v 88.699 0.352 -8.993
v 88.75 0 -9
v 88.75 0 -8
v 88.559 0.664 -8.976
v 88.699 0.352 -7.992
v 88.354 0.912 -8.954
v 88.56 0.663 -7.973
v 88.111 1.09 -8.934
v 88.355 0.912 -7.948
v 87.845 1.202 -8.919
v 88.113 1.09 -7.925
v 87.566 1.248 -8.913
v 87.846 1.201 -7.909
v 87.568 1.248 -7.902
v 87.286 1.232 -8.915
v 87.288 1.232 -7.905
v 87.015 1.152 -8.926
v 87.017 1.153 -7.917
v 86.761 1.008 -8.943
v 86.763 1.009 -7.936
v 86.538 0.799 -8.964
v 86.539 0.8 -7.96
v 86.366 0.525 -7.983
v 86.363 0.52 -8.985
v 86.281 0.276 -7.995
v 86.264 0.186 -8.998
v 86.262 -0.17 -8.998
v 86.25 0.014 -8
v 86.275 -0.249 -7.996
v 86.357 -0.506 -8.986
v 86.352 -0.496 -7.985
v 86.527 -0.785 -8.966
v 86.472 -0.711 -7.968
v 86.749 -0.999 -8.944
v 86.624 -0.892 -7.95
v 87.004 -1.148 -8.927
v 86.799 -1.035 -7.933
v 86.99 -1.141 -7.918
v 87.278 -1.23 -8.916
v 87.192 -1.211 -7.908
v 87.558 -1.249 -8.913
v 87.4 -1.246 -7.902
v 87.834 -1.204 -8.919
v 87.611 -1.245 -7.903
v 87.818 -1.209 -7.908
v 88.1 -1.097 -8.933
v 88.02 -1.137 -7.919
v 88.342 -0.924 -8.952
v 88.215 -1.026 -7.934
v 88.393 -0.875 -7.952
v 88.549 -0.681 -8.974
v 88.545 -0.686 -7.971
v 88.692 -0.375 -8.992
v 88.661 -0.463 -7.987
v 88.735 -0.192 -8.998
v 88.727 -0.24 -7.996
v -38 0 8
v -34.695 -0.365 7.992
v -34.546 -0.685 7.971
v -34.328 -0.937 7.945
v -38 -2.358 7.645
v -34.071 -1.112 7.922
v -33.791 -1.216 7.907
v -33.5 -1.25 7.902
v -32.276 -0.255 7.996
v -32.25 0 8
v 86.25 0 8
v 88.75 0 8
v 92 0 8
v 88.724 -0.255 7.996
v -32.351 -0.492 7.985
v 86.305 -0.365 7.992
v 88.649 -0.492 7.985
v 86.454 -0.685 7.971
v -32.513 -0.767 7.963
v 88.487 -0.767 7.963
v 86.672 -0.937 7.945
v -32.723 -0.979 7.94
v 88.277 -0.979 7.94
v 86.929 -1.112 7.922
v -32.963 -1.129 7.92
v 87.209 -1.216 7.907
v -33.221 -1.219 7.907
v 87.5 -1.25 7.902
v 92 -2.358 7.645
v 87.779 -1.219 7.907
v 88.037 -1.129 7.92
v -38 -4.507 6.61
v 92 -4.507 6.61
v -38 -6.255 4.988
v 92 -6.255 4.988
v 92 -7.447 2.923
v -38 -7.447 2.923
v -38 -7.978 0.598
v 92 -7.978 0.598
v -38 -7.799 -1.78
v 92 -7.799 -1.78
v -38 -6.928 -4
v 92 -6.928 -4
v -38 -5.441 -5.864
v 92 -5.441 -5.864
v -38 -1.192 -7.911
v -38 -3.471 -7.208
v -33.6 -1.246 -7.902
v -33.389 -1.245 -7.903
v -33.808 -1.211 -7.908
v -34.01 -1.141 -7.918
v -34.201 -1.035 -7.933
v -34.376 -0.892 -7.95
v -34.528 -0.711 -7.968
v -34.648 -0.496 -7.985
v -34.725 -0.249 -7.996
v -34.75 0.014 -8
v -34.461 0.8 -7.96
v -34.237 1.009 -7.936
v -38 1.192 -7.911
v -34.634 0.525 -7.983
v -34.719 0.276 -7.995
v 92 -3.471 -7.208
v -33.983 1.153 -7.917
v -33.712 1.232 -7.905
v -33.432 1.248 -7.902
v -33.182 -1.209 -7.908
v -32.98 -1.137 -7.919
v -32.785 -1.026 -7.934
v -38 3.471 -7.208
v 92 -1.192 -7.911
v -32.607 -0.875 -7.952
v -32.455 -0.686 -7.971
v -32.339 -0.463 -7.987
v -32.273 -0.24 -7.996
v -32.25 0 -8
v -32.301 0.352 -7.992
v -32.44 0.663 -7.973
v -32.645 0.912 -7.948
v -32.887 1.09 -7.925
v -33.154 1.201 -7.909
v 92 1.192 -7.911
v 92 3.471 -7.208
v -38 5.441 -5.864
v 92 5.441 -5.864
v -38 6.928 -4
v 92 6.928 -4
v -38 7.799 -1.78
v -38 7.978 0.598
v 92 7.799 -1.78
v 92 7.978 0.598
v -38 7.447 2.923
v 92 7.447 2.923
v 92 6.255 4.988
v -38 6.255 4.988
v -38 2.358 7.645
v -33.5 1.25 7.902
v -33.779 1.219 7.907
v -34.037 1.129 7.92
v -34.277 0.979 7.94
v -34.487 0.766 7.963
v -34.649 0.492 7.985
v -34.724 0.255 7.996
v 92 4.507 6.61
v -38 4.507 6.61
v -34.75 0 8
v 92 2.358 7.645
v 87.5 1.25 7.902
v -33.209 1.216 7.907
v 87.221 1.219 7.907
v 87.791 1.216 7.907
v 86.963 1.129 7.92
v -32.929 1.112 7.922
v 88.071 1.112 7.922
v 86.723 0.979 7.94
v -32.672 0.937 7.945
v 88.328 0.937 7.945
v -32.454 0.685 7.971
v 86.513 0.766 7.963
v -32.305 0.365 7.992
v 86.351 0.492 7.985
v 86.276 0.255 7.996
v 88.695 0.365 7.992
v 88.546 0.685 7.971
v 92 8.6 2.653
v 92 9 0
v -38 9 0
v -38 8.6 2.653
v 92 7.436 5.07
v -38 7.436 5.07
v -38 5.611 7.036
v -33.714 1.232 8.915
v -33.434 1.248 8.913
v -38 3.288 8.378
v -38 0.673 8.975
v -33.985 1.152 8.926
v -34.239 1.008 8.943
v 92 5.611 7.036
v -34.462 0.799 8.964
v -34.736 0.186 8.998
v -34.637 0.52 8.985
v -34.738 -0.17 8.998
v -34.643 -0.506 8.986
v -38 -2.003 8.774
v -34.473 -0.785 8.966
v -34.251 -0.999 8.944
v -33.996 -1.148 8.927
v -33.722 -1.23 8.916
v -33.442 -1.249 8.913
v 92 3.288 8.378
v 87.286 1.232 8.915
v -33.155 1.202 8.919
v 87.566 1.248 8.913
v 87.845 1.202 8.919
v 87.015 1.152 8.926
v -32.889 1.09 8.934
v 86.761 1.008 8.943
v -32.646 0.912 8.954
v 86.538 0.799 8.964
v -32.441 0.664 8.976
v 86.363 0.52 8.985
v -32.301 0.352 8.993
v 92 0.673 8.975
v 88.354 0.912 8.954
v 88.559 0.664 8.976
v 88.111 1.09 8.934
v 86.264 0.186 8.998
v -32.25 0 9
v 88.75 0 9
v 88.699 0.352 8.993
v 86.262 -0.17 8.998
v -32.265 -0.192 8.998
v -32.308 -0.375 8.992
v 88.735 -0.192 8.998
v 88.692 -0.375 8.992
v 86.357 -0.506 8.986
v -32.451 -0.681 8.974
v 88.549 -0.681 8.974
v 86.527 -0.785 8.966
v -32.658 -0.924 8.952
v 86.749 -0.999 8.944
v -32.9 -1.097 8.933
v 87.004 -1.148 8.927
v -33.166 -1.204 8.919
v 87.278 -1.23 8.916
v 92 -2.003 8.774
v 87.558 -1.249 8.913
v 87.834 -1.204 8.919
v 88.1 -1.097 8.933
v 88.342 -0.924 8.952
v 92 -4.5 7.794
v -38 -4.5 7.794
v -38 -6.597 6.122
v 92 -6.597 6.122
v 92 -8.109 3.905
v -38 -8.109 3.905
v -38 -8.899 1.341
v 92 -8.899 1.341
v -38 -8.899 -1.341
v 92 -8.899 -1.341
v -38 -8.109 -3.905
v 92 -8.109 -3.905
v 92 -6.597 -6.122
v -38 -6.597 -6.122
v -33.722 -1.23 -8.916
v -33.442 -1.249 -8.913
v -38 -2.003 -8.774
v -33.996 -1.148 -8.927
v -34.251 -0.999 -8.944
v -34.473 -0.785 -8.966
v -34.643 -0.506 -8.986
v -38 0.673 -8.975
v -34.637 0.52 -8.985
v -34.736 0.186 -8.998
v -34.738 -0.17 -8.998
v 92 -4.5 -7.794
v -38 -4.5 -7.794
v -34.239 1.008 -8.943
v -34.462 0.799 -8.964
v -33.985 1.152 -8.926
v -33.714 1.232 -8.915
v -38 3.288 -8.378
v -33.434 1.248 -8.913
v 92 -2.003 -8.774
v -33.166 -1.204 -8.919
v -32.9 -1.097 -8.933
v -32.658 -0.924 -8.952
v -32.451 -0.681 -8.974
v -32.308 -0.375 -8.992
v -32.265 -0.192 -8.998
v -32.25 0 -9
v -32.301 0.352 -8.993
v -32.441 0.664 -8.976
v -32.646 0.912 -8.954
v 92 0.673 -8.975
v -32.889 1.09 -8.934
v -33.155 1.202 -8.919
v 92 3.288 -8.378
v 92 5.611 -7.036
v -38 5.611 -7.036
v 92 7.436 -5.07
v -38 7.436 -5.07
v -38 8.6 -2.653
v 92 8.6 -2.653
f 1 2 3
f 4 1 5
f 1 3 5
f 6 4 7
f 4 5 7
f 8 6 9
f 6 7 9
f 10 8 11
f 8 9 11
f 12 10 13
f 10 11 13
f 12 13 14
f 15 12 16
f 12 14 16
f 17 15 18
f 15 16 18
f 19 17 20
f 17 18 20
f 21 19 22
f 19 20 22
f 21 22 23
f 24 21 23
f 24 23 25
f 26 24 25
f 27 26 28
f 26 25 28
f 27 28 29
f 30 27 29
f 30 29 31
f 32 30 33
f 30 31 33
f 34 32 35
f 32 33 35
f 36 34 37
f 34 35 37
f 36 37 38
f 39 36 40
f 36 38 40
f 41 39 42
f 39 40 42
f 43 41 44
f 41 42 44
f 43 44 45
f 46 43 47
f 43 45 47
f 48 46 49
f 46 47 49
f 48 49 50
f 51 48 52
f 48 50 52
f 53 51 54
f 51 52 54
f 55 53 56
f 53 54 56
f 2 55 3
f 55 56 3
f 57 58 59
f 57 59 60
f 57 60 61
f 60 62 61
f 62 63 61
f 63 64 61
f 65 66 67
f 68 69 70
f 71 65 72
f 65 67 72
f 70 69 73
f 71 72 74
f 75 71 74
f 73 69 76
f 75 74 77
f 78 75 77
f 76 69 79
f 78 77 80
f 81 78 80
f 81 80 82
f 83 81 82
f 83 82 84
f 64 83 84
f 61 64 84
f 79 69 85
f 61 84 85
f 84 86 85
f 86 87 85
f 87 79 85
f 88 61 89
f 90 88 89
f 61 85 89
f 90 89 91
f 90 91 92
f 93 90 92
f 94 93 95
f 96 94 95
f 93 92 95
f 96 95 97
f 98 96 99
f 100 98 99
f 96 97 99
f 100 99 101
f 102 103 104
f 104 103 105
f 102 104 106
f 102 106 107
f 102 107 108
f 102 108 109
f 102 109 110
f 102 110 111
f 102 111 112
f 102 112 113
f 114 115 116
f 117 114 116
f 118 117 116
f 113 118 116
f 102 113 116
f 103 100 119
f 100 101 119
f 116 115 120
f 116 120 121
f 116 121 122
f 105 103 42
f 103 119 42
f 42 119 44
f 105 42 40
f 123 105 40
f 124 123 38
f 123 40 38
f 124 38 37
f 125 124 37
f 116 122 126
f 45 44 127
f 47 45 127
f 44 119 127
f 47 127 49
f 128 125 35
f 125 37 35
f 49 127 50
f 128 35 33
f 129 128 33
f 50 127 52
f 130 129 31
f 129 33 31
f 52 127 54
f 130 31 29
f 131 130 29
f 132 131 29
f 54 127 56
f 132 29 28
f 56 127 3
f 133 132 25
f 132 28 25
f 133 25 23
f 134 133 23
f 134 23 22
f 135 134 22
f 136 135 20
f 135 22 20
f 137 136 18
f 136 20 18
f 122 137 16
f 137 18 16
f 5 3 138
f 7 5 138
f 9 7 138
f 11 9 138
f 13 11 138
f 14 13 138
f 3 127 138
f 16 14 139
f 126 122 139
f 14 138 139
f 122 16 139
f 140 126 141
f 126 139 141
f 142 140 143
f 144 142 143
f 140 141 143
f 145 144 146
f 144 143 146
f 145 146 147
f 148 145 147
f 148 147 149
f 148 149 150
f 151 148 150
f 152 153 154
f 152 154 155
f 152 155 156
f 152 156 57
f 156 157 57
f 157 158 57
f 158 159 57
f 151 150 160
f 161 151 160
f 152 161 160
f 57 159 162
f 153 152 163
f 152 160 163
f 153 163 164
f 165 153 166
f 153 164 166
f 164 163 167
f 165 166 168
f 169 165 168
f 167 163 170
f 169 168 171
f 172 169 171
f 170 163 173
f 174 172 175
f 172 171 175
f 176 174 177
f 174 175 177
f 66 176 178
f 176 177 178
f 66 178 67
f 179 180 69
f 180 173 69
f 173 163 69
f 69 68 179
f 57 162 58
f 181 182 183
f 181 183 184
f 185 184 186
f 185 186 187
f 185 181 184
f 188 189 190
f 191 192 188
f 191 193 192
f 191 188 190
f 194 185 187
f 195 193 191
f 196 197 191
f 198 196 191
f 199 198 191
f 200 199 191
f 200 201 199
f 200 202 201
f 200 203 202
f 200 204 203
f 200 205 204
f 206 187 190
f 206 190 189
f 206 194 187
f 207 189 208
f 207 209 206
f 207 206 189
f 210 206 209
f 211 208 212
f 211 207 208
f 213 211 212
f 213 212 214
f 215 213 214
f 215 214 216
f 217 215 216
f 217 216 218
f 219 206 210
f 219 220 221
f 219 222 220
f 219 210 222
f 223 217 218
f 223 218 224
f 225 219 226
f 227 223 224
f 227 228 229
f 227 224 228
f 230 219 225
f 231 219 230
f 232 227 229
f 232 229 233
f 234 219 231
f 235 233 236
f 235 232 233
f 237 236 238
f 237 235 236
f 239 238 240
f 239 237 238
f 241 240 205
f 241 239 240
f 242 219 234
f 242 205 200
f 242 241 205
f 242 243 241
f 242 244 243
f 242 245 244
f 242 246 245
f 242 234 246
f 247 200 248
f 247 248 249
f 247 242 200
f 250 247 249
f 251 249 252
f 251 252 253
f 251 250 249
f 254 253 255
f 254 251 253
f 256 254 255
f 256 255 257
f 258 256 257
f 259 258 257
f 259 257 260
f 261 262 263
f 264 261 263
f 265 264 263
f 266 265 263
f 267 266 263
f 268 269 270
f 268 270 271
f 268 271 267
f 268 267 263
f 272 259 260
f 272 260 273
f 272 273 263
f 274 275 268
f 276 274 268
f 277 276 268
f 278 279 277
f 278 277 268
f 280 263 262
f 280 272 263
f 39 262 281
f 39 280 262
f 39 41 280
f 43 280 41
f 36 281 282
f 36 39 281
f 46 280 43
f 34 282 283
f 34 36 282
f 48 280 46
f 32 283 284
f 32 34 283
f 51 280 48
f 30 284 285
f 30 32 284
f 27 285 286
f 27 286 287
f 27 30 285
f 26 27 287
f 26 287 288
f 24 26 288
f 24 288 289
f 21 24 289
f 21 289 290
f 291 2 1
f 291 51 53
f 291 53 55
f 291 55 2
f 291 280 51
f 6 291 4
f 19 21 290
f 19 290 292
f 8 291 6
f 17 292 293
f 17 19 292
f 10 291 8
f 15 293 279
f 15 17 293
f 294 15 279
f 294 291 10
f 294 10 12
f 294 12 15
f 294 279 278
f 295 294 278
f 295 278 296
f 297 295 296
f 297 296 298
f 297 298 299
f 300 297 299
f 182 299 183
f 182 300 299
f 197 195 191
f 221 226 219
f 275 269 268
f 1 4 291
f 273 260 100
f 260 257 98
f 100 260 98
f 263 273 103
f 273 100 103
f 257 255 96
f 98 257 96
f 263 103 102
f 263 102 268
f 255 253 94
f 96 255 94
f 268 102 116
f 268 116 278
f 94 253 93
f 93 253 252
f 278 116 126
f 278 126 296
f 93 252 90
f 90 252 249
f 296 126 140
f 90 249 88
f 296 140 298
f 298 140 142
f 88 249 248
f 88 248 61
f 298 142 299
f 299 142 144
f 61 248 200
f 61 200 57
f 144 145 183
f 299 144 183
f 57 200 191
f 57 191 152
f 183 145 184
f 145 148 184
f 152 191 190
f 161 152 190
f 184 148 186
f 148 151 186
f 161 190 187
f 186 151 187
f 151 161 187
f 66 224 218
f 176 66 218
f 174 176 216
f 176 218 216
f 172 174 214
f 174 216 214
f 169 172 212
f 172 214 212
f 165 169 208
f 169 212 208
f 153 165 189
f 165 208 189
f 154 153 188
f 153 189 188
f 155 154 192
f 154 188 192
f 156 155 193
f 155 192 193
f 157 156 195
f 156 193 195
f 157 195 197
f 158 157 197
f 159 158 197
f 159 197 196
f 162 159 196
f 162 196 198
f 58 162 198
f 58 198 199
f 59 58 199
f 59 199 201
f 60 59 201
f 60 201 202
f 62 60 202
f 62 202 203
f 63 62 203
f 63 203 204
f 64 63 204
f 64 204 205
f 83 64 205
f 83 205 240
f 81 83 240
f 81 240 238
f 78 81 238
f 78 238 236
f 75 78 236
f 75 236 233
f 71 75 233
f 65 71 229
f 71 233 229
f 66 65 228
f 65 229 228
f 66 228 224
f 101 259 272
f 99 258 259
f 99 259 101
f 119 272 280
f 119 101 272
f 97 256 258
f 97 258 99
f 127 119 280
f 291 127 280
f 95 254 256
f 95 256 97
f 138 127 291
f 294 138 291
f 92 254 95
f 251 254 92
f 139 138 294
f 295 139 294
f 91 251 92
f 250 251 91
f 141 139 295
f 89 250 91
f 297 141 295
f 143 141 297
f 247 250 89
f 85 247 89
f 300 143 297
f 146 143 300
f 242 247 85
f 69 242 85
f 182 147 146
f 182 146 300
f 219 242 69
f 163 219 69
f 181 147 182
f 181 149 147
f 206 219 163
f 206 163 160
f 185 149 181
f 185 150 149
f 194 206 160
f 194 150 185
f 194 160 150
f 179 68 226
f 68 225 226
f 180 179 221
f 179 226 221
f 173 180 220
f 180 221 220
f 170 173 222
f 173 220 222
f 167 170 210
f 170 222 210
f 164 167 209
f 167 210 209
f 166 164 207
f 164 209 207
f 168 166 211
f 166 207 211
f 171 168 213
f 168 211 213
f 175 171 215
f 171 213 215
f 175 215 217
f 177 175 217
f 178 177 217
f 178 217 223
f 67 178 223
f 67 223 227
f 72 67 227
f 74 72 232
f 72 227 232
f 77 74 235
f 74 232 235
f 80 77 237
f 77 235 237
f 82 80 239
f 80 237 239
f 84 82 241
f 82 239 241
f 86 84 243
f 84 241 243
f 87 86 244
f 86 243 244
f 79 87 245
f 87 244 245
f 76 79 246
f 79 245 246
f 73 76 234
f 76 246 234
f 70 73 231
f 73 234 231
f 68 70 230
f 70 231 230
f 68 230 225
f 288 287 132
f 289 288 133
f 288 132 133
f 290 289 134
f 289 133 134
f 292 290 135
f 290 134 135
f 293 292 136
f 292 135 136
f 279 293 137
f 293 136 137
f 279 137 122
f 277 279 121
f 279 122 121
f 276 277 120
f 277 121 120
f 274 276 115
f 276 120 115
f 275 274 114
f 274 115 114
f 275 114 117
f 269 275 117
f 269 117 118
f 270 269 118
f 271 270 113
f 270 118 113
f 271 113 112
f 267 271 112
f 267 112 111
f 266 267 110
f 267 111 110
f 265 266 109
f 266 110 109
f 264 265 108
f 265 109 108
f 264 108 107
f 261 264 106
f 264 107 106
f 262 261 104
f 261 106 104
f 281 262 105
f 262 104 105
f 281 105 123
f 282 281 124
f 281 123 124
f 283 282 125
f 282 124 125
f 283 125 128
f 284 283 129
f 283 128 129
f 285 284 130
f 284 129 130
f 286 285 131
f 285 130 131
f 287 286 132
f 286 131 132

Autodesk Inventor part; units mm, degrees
ref_plane "YZ Plane" through (0, 0, 0) normal (1, 0, 0) x (0, 1, 0)
ref_plane "XZ Plane" through (0, 0, 0) normal (0, 1, 0) x (-1, 0, 0)
sketch "ShaftProfile" plane through (0, 0, 0) normal (0, 0, 1) x (1, 0, 0)
  line L0 (-64, 0) -> (118, 0) construction
  line L1 (-38, 9) -> (92, 9)
  line L2 (92, 9) -> (92, 0)
  line L3 (-38, 0) -> (-38, 9)
  line L4 (-38, 0) -> (92, 0)
  point P0 (0, 0)
  dimension "d1" = 130
  dimension "d2" = 9
  dimension "d4" = 38
revolve "ShaftFeature" add sketch "ShaftProfile" angle 360 about axis through (-38, 0, 0) along (1, 0, 0)
sketch "Sketch2" plane through (-38, 0, 0) normal (-1, 0, 0) x (0, 0, 1)
  circle A0 centre (0, 0) radius 9 projected
hole "ShaftHoleFeature" at (-38, 0, 0) direction (1, 0, 0) diameter 16 end through all
ref_plane "MidSidePlane" through (0, 0, 10) normal (0, 0, 1) x (1, 0, 0)
sketch "CapHoles" plane through (0, 0, 10) normal (0, 0, 1) x (1, 0, 0)
  line L0 (92, -9) -> (92, 9) construction
  line L1 (-38, -9) -> (-38, 9) construction
  line L2 (-45, 0) -> (4, 0) construction
  circle A0 centre (-33.5, 0) radius 1.25
  circle A1 centre (87.5, 0) radius 1.25
  dimension "d24" = 2.5
  dimension "d25" = 4.5
  dimension "d26" = 4.5
extrude "CapHolesFeature" cut sketch "CapHoles" against normal through all
equation "\"d26\" = d25"
properties part number "BackPair1PistonShaft"
